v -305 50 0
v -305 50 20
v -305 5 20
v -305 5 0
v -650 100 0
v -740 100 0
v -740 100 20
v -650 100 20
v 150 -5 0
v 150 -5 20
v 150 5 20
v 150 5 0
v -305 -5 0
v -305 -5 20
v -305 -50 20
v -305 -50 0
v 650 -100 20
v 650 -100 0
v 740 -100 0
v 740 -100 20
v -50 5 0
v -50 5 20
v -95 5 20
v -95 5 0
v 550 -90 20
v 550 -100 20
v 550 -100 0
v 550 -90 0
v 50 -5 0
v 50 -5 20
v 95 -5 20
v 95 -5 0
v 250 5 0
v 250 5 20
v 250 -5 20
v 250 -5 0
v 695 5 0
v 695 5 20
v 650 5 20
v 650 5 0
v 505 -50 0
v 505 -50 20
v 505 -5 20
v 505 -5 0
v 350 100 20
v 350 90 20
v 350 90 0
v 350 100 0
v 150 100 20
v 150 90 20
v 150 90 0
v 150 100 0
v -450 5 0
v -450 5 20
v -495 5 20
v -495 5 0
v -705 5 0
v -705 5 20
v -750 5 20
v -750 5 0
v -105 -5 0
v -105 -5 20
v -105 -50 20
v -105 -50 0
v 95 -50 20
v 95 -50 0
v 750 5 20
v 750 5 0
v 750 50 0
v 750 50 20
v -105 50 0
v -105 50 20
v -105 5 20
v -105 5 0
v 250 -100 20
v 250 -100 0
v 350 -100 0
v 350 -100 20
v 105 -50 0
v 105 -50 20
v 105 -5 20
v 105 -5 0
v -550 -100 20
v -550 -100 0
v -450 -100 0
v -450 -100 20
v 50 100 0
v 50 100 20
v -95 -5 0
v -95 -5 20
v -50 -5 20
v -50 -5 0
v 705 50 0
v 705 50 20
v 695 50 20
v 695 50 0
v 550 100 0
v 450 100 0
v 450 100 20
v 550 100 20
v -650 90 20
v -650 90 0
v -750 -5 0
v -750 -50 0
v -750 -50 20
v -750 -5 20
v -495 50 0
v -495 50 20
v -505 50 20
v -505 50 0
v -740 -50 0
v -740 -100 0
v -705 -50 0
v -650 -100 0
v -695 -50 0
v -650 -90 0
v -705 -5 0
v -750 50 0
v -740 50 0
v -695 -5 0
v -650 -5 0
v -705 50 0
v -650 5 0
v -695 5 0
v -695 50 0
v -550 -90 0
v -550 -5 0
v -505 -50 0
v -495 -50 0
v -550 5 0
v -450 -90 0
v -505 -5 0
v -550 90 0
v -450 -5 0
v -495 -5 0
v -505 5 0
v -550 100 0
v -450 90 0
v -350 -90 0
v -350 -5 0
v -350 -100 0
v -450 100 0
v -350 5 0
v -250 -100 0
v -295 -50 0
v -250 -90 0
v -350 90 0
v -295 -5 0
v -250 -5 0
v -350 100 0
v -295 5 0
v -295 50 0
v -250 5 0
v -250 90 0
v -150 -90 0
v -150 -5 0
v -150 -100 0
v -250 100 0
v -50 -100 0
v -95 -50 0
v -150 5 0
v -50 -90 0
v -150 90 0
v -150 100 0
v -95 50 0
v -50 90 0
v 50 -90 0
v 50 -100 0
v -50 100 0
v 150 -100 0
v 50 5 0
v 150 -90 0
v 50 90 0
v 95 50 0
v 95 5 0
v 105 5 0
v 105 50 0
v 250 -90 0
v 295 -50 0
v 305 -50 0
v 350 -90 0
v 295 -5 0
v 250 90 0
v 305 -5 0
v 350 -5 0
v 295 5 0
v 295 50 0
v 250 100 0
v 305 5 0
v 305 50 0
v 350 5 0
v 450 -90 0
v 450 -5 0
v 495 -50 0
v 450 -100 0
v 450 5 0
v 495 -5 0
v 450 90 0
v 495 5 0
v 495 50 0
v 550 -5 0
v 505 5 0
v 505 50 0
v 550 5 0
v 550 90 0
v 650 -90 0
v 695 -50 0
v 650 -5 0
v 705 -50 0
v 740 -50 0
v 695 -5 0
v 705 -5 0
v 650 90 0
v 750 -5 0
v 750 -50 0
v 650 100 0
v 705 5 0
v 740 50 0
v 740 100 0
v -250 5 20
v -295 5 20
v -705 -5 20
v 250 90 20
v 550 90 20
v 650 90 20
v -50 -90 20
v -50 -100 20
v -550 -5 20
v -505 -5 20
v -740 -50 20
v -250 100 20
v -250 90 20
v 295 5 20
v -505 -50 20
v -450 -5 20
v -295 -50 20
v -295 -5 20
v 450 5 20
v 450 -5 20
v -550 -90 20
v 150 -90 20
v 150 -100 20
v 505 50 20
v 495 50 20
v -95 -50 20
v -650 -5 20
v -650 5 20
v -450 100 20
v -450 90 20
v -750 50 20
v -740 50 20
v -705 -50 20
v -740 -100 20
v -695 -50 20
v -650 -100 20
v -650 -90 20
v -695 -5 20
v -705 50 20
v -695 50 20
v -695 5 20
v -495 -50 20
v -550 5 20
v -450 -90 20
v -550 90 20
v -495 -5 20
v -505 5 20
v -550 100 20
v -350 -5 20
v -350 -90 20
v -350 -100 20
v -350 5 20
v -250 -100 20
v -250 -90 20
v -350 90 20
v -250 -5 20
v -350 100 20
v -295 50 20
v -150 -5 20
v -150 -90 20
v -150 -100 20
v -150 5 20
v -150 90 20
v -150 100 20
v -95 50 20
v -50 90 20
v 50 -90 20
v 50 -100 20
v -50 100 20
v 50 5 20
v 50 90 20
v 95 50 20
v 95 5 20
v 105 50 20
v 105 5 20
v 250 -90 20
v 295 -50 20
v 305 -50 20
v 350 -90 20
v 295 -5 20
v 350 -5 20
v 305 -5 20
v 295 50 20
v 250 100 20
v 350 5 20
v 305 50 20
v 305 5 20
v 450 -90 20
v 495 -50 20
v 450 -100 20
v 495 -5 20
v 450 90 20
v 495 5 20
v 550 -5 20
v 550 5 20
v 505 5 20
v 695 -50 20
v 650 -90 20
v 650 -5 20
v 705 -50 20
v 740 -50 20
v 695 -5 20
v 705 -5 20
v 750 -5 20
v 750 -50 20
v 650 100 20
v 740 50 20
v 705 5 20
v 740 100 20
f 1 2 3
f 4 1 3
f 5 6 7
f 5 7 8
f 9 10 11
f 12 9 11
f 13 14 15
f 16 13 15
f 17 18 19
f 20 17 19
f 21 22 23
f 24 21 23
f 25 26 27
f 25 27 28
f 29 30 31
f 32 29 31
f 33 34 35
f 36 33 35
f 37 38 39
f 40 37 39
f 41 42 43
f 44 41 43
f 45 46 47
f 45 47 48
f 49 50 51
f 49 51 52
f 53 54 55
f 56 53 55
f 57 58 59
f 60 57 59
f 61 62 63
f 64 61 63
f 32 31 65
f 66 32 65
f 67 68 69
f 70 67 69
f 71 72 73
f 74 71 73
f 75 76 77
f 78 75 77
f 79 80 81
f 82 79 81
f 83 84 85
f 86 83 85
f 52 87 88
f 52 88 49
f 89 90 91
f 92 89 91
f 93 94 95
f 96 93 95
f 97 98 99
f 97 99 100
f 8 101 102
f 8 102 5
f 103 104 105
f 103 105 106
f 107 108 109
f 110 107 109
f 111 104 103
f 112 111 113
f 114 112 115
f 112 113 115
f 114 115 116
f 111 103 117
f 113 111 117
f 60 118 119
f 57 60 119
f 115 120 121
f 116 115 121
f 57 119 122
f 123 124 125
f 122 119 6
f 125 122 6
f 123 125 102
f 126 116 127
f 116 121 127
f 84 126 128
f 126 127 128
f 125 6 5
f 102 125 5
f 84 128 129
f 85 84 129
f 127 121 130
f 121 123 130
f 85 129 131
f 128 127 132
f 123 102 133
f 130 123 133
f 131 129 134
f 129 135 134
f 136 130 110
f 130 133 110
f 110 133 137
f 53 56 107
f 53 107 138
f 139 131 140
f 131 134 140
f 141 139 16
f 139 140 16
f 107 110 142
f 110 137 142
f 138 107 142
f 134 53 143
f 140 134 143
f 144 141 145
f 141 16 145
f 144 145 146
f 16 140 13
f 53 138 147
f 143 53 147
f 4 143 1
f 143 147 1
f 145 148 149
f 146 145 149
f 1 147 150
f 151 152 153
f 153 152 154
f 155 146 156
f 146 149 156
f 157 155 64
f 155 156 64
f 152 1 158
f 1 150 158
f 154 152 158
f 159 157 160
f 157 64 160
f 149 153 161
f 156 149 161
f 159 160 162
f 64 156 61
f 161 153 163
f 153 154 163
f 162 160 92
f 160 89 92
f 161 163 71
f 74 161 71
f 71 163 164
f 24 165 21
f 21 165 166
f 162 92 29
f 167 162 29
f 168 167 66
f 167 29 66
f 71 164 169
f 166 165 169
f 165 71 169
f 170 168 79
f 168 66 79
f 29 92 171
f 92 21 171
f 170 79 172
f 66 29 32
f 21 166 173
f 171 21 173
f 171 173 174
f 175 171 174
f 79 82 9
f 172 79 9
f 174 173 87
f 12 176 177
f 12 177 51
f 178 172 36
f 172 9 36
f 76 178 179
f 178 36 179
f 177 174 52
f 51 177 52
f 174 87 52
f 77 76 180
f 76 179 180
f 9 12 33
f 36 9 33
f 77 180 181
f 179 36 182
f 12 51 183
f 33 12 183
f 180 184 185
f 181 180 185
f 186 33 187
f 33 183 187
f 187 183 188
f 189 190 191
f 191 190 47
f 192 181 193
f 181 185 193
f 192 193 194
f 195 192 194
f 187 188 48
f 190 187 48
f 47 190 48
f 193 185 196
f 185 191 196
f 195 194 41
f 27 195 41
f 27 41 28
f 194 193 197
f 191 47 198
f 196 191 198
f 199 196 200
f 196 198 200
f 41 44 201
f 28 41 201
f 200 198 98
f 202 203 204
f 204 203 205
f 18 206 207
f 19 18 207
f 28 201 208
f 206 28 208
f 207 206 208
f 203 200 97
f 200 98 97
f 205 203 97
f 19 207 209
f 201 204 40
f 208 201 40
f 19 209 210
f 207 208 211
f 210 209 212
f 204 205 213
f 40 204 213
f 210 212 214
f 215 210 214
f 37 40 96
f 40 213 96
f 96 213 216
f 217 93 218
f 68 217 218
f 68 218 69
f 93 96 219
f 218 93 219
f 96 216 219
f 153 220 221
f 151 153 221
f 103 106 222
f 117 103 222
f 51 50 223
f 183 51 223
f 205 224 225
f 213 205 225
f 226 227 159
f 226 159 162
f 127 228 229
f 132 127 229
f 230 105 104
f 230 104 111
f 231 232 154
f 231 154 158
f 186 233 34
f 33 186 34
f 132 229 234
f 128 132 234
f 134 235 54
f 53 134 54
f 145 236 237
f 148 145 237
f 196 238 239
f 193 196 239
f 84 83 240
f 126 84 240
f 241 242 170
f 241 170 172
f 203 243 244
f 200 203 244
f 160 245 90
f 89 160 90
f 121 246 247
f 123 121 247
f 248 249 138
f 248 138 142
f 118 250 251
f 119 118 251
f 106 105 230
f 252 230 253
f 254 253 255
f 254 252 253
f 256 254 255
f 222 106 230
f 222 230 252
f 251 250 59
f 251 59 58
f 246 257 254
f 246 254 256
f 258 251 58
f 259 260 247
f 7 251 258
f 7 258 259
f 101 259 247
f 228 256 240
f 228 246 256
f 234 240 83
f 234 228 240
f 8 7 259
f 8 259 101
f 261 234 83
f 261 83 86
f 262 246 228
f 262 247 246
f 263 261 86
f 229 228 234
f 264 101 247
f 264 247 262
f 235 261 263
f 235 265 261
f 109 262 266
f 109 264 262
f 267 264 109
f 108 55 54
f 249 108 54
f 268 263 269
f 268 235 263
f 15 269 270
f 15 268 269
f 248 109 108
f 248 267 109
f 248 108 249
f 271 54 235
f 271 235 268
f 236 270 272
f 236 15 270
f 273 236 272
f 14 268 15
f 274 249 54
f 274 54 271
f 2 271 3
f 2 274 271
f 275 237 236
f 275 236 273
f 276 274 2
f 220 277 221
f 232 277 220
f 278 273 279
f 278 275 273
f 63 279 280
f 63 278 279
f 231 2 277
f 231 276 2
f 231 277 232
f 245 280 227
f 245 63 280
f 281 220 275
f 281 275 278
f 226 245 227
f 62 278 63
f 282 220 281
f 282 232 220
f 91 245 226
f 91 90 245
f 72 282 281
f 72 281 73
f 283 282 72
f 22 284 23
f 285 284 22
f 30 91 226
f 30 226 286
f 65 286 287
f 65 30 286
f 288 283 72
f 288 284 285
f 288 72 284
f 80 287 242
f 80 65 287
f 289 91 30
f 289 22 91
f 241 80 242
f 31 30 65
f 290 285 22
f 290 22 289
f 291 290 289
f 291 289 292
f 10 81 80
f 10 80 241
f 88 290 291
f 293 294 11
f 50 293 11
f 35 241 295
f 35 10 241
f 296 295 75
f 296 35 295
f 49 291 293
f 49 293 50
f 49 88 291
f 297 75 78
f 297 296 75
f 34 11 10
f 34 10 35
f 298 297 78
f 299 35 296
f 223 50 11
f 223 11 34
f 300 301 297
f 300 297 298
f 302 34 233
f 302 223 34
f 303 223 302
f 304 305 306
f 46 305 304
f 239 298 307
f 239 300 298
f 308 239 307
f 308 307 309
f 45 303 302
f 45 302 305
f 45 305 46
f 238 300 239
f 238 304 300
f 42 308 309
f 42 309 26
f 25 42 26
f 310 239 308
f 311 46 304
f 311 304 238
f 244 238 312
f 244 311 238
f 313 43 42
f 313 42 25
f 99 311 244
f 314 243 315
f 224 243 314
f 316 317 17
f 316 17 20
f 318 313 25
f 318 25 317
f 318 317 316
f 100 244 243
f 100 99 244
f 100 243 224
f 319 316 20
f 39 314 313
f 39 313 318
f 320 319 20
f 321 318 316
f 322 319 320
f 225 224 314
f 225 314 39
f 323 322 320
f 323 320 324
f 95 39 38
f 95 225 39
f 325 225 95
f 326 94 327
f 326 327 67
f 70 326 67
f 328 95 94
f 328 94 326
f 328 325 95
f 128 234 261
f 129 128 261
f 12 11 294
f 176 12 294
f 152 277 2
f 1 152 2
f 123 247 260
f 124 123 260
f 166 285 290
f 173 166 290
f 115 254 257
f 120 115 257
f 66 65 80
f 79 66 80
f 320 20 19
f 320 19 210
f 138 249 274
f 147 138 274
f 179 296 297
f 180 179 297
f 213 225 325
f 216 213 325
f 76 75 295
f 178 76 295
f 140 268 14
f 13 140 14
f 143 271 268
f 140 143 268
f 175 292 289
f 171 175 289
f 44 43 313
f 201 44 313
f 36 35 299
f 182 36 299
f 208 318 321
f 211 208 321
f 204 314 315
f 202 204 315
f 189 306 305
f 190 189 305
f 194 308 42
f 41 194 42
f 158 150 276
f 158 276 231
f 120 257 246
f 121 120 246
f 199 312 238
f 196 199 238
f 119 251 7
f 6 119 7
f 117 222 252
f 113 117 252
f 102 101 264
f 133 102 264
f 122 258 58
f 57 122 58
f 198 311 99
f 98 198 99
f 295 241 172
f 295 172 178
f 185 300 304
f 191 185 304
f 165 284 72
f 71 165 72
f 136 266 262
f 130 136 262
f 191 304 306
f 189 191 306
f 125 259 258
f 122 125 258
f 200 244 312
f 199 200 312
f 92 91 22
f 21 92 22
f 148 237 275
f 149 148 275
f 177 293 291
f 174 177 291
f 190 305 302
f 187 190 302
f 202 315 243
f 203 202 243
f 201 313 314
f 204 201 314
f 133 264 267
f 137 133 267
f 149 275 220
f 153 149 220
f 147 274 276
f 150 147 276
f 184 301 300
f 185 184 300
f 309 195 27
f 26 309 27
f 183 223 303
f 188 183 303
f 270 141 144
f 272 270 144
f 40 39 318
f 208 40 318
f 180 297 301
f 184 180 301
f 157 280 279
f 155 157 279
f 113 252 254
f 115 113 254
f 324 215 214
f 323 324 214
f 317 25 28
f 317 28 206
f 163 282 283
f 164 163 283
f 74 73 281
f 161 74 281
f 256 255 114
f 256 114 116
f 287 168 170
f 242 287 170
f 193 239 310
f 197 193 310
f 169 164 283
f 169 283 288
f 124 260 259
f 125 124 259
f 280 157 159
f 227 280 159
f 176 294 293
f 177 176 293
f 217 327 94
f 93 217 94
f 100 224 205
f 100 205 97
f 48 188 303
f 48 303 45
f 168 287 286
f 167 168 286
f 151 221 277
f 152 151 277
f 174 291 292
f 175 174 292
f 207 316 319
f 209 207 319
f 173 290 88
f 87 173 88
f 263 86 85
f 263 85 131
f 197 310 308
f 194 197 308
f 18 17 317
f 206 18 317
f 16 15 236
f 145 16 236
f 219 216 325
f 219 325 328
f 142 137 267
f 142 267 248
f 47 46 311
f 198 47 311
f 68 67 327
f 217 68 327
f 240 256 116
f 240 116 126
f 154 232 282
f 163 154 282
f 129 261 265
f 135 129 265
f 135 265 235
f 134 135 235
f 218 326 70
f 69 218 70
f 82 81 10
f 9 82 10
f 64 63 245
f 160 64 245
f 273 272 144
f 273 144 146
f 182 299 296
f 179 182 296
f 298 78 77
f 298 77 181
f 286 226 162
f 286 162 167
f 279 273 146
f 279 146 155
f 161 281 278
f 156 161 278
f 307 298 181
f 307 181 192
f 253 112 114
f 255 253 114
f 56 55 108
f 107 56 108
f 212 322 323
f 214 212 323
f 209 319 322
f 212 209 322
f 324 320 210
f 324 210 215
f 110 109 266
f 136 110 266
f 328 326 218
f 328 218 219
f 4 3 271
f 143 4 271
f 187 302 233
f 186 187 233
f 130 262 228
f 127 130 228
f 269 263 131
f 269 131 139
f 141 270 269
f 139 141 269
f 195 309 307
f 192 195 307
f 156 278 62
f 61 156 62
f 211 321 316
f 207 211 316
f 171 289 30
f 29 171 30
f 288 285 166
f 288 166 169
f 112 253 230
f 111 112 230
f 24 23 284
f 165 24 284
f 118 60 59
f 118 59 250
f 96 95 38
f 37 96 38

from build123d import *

# Parameters (mm, degrees)
F0_W     = 1500
F0_H     = 200
F1_DEPTH = 20
F2_W     = 100
F2_H     = 10
F3_DEPTH = 20.001
F5_DEPTH = 20.001
F6_W     = 10
F6_H     = 50
F7_DEPTH = 20.001


with BuildPart() as f1:
    # F0 (on Top) → F1 (new body)
    with BuildSketch(Plane.XY):
        Rectangle(F0_W, F0_H)
    extrude(amount=F1_DEPTH)

    # F2 (on face) → F3 (cut, through all)
    with BuildSketch(Plane.XY.offset(20)):
        with Locations((-600, 95)):
            Rectangle(F2_W, F2_H)
        with Locations((-600, -95)):
            Rectangle(F2_W, F2_H)
        with Locations((-400, 95)):
            Rectangle(F2_W, F2_H)
        with Locations((-400, -95)):
            Rectangle(F2_W, F2_H)
        with Locations((-200, 95)):
            Rectangle(F2_W, F2_H)
        with Locations((-200, -95)):
            Rectangle(F2_W, F2_H)
        with Locations((0, 95)):
            Rectangle(F2_W, F2_H)
        with Locations((0, -95)):
            Rectangle(F2_W, F2_H)
        with Locations((200, 95)):
            Rectangle(F2_W, F2_H)
        with Locations((200, -95)):
            Rectangle(F2_W, F2_H)
        with Locations((400, 95)):
            Rectangle(F2_W, F2_H)
        with Locations((400, -95)):
            Rectangle(F2_W, F2_H)
        with Locations((600, 95)):
            Rectangle(F2_W, F2_H)
        with Locations((600, -95)):
            Rectangle(F2_W, F2_H)
    extrude(amount=-F3_DEPTH, mode=Mode.SUBTRACT)

    # F4 (on face) → F5 (cut, through all)
    with BuildSketch(Plane.XY.offset(20)):
        Polygon((-695, 50), (-705, 50), (-705, 5), (-750, 5), (-750, -5), (-705, -5), (-705, -50), (-695, -50), (-695, -5), (-650, -5), (-650, 5), (-695, 5), align=None)
        Polygon((-495, -50), (-495, -5), (-450, -5), (-450, 5), (-495, 5), (-495, 50), (-505, 50), (-505, 5), (-550, 5), (-550, -5), (-505, -5), (-505, -50), align=None)
        Polygon((-295, -50), (-295, -5), (-250, -5), (-250, 5), (-295, 5), (-295, 50), (-305, 50), (-305, 5), (-350, 5), (-350, -5), (-305, -5), (-305, -50), align=None)
        Polygon((-95, -50), (-95, -5), (-50, -5), (-50, 5), (-95, 5), (-95, 50), (-105, 50), (-105, 5), (-150, 5), (-150, -5), (-105, -5), (-105, -50), align=None)
        Polygon((105, -50), (105, -5), (150, -5), (150, 5), (105, 5), (105, 50), (95, 50), (95, 5), (50, 5), (50, -5), (95, -5), (95, -50), align=None)
        Polygon((305, -50), (305, -5), (350, -5), (350, 5), (305, 5), (305, 50), (295, 50), (295, 5), (250, 5), (250, -5), (295, -5), (295, -50), align=None)
        Polygon((505, -50), (505, -5), (550, -5), (550, 5), (505, 5), (505, 50), (495, 50), (495, 5), (450, 5), (450, -5), (495, -5), (495, -50), align=None)
        Polygon((705, -50), (705, -5), (750, -5), (750, 5), (705, 5), (705, 50), (695, 50), (695, 5), (650, 5), (650, -5), (695, -5), (695, -50), align=None)
    extrude(amount=-F5_DEPTH, mode=Mode.SUBTRACT)

    # F6 (on face) → F7 (cut, through all)
    with BuildSketch(Plane.XY.offset(20)):
        with Locations((-745, 75)):
            Rectangle(F6_W, F6_H)
        with Locations((-745, -75)):
            Rectangle(F6_W, F6_H)
        with Locations((745, 75)):
            Rectangle(F6_W, F6_H)
        with Locations((745, -75)):
            Rectangle(F6_W, F6_H)
    extrude(amount=-F7_DEPTH, mode=Mode.SUBTRACT)


solid = f1.part
